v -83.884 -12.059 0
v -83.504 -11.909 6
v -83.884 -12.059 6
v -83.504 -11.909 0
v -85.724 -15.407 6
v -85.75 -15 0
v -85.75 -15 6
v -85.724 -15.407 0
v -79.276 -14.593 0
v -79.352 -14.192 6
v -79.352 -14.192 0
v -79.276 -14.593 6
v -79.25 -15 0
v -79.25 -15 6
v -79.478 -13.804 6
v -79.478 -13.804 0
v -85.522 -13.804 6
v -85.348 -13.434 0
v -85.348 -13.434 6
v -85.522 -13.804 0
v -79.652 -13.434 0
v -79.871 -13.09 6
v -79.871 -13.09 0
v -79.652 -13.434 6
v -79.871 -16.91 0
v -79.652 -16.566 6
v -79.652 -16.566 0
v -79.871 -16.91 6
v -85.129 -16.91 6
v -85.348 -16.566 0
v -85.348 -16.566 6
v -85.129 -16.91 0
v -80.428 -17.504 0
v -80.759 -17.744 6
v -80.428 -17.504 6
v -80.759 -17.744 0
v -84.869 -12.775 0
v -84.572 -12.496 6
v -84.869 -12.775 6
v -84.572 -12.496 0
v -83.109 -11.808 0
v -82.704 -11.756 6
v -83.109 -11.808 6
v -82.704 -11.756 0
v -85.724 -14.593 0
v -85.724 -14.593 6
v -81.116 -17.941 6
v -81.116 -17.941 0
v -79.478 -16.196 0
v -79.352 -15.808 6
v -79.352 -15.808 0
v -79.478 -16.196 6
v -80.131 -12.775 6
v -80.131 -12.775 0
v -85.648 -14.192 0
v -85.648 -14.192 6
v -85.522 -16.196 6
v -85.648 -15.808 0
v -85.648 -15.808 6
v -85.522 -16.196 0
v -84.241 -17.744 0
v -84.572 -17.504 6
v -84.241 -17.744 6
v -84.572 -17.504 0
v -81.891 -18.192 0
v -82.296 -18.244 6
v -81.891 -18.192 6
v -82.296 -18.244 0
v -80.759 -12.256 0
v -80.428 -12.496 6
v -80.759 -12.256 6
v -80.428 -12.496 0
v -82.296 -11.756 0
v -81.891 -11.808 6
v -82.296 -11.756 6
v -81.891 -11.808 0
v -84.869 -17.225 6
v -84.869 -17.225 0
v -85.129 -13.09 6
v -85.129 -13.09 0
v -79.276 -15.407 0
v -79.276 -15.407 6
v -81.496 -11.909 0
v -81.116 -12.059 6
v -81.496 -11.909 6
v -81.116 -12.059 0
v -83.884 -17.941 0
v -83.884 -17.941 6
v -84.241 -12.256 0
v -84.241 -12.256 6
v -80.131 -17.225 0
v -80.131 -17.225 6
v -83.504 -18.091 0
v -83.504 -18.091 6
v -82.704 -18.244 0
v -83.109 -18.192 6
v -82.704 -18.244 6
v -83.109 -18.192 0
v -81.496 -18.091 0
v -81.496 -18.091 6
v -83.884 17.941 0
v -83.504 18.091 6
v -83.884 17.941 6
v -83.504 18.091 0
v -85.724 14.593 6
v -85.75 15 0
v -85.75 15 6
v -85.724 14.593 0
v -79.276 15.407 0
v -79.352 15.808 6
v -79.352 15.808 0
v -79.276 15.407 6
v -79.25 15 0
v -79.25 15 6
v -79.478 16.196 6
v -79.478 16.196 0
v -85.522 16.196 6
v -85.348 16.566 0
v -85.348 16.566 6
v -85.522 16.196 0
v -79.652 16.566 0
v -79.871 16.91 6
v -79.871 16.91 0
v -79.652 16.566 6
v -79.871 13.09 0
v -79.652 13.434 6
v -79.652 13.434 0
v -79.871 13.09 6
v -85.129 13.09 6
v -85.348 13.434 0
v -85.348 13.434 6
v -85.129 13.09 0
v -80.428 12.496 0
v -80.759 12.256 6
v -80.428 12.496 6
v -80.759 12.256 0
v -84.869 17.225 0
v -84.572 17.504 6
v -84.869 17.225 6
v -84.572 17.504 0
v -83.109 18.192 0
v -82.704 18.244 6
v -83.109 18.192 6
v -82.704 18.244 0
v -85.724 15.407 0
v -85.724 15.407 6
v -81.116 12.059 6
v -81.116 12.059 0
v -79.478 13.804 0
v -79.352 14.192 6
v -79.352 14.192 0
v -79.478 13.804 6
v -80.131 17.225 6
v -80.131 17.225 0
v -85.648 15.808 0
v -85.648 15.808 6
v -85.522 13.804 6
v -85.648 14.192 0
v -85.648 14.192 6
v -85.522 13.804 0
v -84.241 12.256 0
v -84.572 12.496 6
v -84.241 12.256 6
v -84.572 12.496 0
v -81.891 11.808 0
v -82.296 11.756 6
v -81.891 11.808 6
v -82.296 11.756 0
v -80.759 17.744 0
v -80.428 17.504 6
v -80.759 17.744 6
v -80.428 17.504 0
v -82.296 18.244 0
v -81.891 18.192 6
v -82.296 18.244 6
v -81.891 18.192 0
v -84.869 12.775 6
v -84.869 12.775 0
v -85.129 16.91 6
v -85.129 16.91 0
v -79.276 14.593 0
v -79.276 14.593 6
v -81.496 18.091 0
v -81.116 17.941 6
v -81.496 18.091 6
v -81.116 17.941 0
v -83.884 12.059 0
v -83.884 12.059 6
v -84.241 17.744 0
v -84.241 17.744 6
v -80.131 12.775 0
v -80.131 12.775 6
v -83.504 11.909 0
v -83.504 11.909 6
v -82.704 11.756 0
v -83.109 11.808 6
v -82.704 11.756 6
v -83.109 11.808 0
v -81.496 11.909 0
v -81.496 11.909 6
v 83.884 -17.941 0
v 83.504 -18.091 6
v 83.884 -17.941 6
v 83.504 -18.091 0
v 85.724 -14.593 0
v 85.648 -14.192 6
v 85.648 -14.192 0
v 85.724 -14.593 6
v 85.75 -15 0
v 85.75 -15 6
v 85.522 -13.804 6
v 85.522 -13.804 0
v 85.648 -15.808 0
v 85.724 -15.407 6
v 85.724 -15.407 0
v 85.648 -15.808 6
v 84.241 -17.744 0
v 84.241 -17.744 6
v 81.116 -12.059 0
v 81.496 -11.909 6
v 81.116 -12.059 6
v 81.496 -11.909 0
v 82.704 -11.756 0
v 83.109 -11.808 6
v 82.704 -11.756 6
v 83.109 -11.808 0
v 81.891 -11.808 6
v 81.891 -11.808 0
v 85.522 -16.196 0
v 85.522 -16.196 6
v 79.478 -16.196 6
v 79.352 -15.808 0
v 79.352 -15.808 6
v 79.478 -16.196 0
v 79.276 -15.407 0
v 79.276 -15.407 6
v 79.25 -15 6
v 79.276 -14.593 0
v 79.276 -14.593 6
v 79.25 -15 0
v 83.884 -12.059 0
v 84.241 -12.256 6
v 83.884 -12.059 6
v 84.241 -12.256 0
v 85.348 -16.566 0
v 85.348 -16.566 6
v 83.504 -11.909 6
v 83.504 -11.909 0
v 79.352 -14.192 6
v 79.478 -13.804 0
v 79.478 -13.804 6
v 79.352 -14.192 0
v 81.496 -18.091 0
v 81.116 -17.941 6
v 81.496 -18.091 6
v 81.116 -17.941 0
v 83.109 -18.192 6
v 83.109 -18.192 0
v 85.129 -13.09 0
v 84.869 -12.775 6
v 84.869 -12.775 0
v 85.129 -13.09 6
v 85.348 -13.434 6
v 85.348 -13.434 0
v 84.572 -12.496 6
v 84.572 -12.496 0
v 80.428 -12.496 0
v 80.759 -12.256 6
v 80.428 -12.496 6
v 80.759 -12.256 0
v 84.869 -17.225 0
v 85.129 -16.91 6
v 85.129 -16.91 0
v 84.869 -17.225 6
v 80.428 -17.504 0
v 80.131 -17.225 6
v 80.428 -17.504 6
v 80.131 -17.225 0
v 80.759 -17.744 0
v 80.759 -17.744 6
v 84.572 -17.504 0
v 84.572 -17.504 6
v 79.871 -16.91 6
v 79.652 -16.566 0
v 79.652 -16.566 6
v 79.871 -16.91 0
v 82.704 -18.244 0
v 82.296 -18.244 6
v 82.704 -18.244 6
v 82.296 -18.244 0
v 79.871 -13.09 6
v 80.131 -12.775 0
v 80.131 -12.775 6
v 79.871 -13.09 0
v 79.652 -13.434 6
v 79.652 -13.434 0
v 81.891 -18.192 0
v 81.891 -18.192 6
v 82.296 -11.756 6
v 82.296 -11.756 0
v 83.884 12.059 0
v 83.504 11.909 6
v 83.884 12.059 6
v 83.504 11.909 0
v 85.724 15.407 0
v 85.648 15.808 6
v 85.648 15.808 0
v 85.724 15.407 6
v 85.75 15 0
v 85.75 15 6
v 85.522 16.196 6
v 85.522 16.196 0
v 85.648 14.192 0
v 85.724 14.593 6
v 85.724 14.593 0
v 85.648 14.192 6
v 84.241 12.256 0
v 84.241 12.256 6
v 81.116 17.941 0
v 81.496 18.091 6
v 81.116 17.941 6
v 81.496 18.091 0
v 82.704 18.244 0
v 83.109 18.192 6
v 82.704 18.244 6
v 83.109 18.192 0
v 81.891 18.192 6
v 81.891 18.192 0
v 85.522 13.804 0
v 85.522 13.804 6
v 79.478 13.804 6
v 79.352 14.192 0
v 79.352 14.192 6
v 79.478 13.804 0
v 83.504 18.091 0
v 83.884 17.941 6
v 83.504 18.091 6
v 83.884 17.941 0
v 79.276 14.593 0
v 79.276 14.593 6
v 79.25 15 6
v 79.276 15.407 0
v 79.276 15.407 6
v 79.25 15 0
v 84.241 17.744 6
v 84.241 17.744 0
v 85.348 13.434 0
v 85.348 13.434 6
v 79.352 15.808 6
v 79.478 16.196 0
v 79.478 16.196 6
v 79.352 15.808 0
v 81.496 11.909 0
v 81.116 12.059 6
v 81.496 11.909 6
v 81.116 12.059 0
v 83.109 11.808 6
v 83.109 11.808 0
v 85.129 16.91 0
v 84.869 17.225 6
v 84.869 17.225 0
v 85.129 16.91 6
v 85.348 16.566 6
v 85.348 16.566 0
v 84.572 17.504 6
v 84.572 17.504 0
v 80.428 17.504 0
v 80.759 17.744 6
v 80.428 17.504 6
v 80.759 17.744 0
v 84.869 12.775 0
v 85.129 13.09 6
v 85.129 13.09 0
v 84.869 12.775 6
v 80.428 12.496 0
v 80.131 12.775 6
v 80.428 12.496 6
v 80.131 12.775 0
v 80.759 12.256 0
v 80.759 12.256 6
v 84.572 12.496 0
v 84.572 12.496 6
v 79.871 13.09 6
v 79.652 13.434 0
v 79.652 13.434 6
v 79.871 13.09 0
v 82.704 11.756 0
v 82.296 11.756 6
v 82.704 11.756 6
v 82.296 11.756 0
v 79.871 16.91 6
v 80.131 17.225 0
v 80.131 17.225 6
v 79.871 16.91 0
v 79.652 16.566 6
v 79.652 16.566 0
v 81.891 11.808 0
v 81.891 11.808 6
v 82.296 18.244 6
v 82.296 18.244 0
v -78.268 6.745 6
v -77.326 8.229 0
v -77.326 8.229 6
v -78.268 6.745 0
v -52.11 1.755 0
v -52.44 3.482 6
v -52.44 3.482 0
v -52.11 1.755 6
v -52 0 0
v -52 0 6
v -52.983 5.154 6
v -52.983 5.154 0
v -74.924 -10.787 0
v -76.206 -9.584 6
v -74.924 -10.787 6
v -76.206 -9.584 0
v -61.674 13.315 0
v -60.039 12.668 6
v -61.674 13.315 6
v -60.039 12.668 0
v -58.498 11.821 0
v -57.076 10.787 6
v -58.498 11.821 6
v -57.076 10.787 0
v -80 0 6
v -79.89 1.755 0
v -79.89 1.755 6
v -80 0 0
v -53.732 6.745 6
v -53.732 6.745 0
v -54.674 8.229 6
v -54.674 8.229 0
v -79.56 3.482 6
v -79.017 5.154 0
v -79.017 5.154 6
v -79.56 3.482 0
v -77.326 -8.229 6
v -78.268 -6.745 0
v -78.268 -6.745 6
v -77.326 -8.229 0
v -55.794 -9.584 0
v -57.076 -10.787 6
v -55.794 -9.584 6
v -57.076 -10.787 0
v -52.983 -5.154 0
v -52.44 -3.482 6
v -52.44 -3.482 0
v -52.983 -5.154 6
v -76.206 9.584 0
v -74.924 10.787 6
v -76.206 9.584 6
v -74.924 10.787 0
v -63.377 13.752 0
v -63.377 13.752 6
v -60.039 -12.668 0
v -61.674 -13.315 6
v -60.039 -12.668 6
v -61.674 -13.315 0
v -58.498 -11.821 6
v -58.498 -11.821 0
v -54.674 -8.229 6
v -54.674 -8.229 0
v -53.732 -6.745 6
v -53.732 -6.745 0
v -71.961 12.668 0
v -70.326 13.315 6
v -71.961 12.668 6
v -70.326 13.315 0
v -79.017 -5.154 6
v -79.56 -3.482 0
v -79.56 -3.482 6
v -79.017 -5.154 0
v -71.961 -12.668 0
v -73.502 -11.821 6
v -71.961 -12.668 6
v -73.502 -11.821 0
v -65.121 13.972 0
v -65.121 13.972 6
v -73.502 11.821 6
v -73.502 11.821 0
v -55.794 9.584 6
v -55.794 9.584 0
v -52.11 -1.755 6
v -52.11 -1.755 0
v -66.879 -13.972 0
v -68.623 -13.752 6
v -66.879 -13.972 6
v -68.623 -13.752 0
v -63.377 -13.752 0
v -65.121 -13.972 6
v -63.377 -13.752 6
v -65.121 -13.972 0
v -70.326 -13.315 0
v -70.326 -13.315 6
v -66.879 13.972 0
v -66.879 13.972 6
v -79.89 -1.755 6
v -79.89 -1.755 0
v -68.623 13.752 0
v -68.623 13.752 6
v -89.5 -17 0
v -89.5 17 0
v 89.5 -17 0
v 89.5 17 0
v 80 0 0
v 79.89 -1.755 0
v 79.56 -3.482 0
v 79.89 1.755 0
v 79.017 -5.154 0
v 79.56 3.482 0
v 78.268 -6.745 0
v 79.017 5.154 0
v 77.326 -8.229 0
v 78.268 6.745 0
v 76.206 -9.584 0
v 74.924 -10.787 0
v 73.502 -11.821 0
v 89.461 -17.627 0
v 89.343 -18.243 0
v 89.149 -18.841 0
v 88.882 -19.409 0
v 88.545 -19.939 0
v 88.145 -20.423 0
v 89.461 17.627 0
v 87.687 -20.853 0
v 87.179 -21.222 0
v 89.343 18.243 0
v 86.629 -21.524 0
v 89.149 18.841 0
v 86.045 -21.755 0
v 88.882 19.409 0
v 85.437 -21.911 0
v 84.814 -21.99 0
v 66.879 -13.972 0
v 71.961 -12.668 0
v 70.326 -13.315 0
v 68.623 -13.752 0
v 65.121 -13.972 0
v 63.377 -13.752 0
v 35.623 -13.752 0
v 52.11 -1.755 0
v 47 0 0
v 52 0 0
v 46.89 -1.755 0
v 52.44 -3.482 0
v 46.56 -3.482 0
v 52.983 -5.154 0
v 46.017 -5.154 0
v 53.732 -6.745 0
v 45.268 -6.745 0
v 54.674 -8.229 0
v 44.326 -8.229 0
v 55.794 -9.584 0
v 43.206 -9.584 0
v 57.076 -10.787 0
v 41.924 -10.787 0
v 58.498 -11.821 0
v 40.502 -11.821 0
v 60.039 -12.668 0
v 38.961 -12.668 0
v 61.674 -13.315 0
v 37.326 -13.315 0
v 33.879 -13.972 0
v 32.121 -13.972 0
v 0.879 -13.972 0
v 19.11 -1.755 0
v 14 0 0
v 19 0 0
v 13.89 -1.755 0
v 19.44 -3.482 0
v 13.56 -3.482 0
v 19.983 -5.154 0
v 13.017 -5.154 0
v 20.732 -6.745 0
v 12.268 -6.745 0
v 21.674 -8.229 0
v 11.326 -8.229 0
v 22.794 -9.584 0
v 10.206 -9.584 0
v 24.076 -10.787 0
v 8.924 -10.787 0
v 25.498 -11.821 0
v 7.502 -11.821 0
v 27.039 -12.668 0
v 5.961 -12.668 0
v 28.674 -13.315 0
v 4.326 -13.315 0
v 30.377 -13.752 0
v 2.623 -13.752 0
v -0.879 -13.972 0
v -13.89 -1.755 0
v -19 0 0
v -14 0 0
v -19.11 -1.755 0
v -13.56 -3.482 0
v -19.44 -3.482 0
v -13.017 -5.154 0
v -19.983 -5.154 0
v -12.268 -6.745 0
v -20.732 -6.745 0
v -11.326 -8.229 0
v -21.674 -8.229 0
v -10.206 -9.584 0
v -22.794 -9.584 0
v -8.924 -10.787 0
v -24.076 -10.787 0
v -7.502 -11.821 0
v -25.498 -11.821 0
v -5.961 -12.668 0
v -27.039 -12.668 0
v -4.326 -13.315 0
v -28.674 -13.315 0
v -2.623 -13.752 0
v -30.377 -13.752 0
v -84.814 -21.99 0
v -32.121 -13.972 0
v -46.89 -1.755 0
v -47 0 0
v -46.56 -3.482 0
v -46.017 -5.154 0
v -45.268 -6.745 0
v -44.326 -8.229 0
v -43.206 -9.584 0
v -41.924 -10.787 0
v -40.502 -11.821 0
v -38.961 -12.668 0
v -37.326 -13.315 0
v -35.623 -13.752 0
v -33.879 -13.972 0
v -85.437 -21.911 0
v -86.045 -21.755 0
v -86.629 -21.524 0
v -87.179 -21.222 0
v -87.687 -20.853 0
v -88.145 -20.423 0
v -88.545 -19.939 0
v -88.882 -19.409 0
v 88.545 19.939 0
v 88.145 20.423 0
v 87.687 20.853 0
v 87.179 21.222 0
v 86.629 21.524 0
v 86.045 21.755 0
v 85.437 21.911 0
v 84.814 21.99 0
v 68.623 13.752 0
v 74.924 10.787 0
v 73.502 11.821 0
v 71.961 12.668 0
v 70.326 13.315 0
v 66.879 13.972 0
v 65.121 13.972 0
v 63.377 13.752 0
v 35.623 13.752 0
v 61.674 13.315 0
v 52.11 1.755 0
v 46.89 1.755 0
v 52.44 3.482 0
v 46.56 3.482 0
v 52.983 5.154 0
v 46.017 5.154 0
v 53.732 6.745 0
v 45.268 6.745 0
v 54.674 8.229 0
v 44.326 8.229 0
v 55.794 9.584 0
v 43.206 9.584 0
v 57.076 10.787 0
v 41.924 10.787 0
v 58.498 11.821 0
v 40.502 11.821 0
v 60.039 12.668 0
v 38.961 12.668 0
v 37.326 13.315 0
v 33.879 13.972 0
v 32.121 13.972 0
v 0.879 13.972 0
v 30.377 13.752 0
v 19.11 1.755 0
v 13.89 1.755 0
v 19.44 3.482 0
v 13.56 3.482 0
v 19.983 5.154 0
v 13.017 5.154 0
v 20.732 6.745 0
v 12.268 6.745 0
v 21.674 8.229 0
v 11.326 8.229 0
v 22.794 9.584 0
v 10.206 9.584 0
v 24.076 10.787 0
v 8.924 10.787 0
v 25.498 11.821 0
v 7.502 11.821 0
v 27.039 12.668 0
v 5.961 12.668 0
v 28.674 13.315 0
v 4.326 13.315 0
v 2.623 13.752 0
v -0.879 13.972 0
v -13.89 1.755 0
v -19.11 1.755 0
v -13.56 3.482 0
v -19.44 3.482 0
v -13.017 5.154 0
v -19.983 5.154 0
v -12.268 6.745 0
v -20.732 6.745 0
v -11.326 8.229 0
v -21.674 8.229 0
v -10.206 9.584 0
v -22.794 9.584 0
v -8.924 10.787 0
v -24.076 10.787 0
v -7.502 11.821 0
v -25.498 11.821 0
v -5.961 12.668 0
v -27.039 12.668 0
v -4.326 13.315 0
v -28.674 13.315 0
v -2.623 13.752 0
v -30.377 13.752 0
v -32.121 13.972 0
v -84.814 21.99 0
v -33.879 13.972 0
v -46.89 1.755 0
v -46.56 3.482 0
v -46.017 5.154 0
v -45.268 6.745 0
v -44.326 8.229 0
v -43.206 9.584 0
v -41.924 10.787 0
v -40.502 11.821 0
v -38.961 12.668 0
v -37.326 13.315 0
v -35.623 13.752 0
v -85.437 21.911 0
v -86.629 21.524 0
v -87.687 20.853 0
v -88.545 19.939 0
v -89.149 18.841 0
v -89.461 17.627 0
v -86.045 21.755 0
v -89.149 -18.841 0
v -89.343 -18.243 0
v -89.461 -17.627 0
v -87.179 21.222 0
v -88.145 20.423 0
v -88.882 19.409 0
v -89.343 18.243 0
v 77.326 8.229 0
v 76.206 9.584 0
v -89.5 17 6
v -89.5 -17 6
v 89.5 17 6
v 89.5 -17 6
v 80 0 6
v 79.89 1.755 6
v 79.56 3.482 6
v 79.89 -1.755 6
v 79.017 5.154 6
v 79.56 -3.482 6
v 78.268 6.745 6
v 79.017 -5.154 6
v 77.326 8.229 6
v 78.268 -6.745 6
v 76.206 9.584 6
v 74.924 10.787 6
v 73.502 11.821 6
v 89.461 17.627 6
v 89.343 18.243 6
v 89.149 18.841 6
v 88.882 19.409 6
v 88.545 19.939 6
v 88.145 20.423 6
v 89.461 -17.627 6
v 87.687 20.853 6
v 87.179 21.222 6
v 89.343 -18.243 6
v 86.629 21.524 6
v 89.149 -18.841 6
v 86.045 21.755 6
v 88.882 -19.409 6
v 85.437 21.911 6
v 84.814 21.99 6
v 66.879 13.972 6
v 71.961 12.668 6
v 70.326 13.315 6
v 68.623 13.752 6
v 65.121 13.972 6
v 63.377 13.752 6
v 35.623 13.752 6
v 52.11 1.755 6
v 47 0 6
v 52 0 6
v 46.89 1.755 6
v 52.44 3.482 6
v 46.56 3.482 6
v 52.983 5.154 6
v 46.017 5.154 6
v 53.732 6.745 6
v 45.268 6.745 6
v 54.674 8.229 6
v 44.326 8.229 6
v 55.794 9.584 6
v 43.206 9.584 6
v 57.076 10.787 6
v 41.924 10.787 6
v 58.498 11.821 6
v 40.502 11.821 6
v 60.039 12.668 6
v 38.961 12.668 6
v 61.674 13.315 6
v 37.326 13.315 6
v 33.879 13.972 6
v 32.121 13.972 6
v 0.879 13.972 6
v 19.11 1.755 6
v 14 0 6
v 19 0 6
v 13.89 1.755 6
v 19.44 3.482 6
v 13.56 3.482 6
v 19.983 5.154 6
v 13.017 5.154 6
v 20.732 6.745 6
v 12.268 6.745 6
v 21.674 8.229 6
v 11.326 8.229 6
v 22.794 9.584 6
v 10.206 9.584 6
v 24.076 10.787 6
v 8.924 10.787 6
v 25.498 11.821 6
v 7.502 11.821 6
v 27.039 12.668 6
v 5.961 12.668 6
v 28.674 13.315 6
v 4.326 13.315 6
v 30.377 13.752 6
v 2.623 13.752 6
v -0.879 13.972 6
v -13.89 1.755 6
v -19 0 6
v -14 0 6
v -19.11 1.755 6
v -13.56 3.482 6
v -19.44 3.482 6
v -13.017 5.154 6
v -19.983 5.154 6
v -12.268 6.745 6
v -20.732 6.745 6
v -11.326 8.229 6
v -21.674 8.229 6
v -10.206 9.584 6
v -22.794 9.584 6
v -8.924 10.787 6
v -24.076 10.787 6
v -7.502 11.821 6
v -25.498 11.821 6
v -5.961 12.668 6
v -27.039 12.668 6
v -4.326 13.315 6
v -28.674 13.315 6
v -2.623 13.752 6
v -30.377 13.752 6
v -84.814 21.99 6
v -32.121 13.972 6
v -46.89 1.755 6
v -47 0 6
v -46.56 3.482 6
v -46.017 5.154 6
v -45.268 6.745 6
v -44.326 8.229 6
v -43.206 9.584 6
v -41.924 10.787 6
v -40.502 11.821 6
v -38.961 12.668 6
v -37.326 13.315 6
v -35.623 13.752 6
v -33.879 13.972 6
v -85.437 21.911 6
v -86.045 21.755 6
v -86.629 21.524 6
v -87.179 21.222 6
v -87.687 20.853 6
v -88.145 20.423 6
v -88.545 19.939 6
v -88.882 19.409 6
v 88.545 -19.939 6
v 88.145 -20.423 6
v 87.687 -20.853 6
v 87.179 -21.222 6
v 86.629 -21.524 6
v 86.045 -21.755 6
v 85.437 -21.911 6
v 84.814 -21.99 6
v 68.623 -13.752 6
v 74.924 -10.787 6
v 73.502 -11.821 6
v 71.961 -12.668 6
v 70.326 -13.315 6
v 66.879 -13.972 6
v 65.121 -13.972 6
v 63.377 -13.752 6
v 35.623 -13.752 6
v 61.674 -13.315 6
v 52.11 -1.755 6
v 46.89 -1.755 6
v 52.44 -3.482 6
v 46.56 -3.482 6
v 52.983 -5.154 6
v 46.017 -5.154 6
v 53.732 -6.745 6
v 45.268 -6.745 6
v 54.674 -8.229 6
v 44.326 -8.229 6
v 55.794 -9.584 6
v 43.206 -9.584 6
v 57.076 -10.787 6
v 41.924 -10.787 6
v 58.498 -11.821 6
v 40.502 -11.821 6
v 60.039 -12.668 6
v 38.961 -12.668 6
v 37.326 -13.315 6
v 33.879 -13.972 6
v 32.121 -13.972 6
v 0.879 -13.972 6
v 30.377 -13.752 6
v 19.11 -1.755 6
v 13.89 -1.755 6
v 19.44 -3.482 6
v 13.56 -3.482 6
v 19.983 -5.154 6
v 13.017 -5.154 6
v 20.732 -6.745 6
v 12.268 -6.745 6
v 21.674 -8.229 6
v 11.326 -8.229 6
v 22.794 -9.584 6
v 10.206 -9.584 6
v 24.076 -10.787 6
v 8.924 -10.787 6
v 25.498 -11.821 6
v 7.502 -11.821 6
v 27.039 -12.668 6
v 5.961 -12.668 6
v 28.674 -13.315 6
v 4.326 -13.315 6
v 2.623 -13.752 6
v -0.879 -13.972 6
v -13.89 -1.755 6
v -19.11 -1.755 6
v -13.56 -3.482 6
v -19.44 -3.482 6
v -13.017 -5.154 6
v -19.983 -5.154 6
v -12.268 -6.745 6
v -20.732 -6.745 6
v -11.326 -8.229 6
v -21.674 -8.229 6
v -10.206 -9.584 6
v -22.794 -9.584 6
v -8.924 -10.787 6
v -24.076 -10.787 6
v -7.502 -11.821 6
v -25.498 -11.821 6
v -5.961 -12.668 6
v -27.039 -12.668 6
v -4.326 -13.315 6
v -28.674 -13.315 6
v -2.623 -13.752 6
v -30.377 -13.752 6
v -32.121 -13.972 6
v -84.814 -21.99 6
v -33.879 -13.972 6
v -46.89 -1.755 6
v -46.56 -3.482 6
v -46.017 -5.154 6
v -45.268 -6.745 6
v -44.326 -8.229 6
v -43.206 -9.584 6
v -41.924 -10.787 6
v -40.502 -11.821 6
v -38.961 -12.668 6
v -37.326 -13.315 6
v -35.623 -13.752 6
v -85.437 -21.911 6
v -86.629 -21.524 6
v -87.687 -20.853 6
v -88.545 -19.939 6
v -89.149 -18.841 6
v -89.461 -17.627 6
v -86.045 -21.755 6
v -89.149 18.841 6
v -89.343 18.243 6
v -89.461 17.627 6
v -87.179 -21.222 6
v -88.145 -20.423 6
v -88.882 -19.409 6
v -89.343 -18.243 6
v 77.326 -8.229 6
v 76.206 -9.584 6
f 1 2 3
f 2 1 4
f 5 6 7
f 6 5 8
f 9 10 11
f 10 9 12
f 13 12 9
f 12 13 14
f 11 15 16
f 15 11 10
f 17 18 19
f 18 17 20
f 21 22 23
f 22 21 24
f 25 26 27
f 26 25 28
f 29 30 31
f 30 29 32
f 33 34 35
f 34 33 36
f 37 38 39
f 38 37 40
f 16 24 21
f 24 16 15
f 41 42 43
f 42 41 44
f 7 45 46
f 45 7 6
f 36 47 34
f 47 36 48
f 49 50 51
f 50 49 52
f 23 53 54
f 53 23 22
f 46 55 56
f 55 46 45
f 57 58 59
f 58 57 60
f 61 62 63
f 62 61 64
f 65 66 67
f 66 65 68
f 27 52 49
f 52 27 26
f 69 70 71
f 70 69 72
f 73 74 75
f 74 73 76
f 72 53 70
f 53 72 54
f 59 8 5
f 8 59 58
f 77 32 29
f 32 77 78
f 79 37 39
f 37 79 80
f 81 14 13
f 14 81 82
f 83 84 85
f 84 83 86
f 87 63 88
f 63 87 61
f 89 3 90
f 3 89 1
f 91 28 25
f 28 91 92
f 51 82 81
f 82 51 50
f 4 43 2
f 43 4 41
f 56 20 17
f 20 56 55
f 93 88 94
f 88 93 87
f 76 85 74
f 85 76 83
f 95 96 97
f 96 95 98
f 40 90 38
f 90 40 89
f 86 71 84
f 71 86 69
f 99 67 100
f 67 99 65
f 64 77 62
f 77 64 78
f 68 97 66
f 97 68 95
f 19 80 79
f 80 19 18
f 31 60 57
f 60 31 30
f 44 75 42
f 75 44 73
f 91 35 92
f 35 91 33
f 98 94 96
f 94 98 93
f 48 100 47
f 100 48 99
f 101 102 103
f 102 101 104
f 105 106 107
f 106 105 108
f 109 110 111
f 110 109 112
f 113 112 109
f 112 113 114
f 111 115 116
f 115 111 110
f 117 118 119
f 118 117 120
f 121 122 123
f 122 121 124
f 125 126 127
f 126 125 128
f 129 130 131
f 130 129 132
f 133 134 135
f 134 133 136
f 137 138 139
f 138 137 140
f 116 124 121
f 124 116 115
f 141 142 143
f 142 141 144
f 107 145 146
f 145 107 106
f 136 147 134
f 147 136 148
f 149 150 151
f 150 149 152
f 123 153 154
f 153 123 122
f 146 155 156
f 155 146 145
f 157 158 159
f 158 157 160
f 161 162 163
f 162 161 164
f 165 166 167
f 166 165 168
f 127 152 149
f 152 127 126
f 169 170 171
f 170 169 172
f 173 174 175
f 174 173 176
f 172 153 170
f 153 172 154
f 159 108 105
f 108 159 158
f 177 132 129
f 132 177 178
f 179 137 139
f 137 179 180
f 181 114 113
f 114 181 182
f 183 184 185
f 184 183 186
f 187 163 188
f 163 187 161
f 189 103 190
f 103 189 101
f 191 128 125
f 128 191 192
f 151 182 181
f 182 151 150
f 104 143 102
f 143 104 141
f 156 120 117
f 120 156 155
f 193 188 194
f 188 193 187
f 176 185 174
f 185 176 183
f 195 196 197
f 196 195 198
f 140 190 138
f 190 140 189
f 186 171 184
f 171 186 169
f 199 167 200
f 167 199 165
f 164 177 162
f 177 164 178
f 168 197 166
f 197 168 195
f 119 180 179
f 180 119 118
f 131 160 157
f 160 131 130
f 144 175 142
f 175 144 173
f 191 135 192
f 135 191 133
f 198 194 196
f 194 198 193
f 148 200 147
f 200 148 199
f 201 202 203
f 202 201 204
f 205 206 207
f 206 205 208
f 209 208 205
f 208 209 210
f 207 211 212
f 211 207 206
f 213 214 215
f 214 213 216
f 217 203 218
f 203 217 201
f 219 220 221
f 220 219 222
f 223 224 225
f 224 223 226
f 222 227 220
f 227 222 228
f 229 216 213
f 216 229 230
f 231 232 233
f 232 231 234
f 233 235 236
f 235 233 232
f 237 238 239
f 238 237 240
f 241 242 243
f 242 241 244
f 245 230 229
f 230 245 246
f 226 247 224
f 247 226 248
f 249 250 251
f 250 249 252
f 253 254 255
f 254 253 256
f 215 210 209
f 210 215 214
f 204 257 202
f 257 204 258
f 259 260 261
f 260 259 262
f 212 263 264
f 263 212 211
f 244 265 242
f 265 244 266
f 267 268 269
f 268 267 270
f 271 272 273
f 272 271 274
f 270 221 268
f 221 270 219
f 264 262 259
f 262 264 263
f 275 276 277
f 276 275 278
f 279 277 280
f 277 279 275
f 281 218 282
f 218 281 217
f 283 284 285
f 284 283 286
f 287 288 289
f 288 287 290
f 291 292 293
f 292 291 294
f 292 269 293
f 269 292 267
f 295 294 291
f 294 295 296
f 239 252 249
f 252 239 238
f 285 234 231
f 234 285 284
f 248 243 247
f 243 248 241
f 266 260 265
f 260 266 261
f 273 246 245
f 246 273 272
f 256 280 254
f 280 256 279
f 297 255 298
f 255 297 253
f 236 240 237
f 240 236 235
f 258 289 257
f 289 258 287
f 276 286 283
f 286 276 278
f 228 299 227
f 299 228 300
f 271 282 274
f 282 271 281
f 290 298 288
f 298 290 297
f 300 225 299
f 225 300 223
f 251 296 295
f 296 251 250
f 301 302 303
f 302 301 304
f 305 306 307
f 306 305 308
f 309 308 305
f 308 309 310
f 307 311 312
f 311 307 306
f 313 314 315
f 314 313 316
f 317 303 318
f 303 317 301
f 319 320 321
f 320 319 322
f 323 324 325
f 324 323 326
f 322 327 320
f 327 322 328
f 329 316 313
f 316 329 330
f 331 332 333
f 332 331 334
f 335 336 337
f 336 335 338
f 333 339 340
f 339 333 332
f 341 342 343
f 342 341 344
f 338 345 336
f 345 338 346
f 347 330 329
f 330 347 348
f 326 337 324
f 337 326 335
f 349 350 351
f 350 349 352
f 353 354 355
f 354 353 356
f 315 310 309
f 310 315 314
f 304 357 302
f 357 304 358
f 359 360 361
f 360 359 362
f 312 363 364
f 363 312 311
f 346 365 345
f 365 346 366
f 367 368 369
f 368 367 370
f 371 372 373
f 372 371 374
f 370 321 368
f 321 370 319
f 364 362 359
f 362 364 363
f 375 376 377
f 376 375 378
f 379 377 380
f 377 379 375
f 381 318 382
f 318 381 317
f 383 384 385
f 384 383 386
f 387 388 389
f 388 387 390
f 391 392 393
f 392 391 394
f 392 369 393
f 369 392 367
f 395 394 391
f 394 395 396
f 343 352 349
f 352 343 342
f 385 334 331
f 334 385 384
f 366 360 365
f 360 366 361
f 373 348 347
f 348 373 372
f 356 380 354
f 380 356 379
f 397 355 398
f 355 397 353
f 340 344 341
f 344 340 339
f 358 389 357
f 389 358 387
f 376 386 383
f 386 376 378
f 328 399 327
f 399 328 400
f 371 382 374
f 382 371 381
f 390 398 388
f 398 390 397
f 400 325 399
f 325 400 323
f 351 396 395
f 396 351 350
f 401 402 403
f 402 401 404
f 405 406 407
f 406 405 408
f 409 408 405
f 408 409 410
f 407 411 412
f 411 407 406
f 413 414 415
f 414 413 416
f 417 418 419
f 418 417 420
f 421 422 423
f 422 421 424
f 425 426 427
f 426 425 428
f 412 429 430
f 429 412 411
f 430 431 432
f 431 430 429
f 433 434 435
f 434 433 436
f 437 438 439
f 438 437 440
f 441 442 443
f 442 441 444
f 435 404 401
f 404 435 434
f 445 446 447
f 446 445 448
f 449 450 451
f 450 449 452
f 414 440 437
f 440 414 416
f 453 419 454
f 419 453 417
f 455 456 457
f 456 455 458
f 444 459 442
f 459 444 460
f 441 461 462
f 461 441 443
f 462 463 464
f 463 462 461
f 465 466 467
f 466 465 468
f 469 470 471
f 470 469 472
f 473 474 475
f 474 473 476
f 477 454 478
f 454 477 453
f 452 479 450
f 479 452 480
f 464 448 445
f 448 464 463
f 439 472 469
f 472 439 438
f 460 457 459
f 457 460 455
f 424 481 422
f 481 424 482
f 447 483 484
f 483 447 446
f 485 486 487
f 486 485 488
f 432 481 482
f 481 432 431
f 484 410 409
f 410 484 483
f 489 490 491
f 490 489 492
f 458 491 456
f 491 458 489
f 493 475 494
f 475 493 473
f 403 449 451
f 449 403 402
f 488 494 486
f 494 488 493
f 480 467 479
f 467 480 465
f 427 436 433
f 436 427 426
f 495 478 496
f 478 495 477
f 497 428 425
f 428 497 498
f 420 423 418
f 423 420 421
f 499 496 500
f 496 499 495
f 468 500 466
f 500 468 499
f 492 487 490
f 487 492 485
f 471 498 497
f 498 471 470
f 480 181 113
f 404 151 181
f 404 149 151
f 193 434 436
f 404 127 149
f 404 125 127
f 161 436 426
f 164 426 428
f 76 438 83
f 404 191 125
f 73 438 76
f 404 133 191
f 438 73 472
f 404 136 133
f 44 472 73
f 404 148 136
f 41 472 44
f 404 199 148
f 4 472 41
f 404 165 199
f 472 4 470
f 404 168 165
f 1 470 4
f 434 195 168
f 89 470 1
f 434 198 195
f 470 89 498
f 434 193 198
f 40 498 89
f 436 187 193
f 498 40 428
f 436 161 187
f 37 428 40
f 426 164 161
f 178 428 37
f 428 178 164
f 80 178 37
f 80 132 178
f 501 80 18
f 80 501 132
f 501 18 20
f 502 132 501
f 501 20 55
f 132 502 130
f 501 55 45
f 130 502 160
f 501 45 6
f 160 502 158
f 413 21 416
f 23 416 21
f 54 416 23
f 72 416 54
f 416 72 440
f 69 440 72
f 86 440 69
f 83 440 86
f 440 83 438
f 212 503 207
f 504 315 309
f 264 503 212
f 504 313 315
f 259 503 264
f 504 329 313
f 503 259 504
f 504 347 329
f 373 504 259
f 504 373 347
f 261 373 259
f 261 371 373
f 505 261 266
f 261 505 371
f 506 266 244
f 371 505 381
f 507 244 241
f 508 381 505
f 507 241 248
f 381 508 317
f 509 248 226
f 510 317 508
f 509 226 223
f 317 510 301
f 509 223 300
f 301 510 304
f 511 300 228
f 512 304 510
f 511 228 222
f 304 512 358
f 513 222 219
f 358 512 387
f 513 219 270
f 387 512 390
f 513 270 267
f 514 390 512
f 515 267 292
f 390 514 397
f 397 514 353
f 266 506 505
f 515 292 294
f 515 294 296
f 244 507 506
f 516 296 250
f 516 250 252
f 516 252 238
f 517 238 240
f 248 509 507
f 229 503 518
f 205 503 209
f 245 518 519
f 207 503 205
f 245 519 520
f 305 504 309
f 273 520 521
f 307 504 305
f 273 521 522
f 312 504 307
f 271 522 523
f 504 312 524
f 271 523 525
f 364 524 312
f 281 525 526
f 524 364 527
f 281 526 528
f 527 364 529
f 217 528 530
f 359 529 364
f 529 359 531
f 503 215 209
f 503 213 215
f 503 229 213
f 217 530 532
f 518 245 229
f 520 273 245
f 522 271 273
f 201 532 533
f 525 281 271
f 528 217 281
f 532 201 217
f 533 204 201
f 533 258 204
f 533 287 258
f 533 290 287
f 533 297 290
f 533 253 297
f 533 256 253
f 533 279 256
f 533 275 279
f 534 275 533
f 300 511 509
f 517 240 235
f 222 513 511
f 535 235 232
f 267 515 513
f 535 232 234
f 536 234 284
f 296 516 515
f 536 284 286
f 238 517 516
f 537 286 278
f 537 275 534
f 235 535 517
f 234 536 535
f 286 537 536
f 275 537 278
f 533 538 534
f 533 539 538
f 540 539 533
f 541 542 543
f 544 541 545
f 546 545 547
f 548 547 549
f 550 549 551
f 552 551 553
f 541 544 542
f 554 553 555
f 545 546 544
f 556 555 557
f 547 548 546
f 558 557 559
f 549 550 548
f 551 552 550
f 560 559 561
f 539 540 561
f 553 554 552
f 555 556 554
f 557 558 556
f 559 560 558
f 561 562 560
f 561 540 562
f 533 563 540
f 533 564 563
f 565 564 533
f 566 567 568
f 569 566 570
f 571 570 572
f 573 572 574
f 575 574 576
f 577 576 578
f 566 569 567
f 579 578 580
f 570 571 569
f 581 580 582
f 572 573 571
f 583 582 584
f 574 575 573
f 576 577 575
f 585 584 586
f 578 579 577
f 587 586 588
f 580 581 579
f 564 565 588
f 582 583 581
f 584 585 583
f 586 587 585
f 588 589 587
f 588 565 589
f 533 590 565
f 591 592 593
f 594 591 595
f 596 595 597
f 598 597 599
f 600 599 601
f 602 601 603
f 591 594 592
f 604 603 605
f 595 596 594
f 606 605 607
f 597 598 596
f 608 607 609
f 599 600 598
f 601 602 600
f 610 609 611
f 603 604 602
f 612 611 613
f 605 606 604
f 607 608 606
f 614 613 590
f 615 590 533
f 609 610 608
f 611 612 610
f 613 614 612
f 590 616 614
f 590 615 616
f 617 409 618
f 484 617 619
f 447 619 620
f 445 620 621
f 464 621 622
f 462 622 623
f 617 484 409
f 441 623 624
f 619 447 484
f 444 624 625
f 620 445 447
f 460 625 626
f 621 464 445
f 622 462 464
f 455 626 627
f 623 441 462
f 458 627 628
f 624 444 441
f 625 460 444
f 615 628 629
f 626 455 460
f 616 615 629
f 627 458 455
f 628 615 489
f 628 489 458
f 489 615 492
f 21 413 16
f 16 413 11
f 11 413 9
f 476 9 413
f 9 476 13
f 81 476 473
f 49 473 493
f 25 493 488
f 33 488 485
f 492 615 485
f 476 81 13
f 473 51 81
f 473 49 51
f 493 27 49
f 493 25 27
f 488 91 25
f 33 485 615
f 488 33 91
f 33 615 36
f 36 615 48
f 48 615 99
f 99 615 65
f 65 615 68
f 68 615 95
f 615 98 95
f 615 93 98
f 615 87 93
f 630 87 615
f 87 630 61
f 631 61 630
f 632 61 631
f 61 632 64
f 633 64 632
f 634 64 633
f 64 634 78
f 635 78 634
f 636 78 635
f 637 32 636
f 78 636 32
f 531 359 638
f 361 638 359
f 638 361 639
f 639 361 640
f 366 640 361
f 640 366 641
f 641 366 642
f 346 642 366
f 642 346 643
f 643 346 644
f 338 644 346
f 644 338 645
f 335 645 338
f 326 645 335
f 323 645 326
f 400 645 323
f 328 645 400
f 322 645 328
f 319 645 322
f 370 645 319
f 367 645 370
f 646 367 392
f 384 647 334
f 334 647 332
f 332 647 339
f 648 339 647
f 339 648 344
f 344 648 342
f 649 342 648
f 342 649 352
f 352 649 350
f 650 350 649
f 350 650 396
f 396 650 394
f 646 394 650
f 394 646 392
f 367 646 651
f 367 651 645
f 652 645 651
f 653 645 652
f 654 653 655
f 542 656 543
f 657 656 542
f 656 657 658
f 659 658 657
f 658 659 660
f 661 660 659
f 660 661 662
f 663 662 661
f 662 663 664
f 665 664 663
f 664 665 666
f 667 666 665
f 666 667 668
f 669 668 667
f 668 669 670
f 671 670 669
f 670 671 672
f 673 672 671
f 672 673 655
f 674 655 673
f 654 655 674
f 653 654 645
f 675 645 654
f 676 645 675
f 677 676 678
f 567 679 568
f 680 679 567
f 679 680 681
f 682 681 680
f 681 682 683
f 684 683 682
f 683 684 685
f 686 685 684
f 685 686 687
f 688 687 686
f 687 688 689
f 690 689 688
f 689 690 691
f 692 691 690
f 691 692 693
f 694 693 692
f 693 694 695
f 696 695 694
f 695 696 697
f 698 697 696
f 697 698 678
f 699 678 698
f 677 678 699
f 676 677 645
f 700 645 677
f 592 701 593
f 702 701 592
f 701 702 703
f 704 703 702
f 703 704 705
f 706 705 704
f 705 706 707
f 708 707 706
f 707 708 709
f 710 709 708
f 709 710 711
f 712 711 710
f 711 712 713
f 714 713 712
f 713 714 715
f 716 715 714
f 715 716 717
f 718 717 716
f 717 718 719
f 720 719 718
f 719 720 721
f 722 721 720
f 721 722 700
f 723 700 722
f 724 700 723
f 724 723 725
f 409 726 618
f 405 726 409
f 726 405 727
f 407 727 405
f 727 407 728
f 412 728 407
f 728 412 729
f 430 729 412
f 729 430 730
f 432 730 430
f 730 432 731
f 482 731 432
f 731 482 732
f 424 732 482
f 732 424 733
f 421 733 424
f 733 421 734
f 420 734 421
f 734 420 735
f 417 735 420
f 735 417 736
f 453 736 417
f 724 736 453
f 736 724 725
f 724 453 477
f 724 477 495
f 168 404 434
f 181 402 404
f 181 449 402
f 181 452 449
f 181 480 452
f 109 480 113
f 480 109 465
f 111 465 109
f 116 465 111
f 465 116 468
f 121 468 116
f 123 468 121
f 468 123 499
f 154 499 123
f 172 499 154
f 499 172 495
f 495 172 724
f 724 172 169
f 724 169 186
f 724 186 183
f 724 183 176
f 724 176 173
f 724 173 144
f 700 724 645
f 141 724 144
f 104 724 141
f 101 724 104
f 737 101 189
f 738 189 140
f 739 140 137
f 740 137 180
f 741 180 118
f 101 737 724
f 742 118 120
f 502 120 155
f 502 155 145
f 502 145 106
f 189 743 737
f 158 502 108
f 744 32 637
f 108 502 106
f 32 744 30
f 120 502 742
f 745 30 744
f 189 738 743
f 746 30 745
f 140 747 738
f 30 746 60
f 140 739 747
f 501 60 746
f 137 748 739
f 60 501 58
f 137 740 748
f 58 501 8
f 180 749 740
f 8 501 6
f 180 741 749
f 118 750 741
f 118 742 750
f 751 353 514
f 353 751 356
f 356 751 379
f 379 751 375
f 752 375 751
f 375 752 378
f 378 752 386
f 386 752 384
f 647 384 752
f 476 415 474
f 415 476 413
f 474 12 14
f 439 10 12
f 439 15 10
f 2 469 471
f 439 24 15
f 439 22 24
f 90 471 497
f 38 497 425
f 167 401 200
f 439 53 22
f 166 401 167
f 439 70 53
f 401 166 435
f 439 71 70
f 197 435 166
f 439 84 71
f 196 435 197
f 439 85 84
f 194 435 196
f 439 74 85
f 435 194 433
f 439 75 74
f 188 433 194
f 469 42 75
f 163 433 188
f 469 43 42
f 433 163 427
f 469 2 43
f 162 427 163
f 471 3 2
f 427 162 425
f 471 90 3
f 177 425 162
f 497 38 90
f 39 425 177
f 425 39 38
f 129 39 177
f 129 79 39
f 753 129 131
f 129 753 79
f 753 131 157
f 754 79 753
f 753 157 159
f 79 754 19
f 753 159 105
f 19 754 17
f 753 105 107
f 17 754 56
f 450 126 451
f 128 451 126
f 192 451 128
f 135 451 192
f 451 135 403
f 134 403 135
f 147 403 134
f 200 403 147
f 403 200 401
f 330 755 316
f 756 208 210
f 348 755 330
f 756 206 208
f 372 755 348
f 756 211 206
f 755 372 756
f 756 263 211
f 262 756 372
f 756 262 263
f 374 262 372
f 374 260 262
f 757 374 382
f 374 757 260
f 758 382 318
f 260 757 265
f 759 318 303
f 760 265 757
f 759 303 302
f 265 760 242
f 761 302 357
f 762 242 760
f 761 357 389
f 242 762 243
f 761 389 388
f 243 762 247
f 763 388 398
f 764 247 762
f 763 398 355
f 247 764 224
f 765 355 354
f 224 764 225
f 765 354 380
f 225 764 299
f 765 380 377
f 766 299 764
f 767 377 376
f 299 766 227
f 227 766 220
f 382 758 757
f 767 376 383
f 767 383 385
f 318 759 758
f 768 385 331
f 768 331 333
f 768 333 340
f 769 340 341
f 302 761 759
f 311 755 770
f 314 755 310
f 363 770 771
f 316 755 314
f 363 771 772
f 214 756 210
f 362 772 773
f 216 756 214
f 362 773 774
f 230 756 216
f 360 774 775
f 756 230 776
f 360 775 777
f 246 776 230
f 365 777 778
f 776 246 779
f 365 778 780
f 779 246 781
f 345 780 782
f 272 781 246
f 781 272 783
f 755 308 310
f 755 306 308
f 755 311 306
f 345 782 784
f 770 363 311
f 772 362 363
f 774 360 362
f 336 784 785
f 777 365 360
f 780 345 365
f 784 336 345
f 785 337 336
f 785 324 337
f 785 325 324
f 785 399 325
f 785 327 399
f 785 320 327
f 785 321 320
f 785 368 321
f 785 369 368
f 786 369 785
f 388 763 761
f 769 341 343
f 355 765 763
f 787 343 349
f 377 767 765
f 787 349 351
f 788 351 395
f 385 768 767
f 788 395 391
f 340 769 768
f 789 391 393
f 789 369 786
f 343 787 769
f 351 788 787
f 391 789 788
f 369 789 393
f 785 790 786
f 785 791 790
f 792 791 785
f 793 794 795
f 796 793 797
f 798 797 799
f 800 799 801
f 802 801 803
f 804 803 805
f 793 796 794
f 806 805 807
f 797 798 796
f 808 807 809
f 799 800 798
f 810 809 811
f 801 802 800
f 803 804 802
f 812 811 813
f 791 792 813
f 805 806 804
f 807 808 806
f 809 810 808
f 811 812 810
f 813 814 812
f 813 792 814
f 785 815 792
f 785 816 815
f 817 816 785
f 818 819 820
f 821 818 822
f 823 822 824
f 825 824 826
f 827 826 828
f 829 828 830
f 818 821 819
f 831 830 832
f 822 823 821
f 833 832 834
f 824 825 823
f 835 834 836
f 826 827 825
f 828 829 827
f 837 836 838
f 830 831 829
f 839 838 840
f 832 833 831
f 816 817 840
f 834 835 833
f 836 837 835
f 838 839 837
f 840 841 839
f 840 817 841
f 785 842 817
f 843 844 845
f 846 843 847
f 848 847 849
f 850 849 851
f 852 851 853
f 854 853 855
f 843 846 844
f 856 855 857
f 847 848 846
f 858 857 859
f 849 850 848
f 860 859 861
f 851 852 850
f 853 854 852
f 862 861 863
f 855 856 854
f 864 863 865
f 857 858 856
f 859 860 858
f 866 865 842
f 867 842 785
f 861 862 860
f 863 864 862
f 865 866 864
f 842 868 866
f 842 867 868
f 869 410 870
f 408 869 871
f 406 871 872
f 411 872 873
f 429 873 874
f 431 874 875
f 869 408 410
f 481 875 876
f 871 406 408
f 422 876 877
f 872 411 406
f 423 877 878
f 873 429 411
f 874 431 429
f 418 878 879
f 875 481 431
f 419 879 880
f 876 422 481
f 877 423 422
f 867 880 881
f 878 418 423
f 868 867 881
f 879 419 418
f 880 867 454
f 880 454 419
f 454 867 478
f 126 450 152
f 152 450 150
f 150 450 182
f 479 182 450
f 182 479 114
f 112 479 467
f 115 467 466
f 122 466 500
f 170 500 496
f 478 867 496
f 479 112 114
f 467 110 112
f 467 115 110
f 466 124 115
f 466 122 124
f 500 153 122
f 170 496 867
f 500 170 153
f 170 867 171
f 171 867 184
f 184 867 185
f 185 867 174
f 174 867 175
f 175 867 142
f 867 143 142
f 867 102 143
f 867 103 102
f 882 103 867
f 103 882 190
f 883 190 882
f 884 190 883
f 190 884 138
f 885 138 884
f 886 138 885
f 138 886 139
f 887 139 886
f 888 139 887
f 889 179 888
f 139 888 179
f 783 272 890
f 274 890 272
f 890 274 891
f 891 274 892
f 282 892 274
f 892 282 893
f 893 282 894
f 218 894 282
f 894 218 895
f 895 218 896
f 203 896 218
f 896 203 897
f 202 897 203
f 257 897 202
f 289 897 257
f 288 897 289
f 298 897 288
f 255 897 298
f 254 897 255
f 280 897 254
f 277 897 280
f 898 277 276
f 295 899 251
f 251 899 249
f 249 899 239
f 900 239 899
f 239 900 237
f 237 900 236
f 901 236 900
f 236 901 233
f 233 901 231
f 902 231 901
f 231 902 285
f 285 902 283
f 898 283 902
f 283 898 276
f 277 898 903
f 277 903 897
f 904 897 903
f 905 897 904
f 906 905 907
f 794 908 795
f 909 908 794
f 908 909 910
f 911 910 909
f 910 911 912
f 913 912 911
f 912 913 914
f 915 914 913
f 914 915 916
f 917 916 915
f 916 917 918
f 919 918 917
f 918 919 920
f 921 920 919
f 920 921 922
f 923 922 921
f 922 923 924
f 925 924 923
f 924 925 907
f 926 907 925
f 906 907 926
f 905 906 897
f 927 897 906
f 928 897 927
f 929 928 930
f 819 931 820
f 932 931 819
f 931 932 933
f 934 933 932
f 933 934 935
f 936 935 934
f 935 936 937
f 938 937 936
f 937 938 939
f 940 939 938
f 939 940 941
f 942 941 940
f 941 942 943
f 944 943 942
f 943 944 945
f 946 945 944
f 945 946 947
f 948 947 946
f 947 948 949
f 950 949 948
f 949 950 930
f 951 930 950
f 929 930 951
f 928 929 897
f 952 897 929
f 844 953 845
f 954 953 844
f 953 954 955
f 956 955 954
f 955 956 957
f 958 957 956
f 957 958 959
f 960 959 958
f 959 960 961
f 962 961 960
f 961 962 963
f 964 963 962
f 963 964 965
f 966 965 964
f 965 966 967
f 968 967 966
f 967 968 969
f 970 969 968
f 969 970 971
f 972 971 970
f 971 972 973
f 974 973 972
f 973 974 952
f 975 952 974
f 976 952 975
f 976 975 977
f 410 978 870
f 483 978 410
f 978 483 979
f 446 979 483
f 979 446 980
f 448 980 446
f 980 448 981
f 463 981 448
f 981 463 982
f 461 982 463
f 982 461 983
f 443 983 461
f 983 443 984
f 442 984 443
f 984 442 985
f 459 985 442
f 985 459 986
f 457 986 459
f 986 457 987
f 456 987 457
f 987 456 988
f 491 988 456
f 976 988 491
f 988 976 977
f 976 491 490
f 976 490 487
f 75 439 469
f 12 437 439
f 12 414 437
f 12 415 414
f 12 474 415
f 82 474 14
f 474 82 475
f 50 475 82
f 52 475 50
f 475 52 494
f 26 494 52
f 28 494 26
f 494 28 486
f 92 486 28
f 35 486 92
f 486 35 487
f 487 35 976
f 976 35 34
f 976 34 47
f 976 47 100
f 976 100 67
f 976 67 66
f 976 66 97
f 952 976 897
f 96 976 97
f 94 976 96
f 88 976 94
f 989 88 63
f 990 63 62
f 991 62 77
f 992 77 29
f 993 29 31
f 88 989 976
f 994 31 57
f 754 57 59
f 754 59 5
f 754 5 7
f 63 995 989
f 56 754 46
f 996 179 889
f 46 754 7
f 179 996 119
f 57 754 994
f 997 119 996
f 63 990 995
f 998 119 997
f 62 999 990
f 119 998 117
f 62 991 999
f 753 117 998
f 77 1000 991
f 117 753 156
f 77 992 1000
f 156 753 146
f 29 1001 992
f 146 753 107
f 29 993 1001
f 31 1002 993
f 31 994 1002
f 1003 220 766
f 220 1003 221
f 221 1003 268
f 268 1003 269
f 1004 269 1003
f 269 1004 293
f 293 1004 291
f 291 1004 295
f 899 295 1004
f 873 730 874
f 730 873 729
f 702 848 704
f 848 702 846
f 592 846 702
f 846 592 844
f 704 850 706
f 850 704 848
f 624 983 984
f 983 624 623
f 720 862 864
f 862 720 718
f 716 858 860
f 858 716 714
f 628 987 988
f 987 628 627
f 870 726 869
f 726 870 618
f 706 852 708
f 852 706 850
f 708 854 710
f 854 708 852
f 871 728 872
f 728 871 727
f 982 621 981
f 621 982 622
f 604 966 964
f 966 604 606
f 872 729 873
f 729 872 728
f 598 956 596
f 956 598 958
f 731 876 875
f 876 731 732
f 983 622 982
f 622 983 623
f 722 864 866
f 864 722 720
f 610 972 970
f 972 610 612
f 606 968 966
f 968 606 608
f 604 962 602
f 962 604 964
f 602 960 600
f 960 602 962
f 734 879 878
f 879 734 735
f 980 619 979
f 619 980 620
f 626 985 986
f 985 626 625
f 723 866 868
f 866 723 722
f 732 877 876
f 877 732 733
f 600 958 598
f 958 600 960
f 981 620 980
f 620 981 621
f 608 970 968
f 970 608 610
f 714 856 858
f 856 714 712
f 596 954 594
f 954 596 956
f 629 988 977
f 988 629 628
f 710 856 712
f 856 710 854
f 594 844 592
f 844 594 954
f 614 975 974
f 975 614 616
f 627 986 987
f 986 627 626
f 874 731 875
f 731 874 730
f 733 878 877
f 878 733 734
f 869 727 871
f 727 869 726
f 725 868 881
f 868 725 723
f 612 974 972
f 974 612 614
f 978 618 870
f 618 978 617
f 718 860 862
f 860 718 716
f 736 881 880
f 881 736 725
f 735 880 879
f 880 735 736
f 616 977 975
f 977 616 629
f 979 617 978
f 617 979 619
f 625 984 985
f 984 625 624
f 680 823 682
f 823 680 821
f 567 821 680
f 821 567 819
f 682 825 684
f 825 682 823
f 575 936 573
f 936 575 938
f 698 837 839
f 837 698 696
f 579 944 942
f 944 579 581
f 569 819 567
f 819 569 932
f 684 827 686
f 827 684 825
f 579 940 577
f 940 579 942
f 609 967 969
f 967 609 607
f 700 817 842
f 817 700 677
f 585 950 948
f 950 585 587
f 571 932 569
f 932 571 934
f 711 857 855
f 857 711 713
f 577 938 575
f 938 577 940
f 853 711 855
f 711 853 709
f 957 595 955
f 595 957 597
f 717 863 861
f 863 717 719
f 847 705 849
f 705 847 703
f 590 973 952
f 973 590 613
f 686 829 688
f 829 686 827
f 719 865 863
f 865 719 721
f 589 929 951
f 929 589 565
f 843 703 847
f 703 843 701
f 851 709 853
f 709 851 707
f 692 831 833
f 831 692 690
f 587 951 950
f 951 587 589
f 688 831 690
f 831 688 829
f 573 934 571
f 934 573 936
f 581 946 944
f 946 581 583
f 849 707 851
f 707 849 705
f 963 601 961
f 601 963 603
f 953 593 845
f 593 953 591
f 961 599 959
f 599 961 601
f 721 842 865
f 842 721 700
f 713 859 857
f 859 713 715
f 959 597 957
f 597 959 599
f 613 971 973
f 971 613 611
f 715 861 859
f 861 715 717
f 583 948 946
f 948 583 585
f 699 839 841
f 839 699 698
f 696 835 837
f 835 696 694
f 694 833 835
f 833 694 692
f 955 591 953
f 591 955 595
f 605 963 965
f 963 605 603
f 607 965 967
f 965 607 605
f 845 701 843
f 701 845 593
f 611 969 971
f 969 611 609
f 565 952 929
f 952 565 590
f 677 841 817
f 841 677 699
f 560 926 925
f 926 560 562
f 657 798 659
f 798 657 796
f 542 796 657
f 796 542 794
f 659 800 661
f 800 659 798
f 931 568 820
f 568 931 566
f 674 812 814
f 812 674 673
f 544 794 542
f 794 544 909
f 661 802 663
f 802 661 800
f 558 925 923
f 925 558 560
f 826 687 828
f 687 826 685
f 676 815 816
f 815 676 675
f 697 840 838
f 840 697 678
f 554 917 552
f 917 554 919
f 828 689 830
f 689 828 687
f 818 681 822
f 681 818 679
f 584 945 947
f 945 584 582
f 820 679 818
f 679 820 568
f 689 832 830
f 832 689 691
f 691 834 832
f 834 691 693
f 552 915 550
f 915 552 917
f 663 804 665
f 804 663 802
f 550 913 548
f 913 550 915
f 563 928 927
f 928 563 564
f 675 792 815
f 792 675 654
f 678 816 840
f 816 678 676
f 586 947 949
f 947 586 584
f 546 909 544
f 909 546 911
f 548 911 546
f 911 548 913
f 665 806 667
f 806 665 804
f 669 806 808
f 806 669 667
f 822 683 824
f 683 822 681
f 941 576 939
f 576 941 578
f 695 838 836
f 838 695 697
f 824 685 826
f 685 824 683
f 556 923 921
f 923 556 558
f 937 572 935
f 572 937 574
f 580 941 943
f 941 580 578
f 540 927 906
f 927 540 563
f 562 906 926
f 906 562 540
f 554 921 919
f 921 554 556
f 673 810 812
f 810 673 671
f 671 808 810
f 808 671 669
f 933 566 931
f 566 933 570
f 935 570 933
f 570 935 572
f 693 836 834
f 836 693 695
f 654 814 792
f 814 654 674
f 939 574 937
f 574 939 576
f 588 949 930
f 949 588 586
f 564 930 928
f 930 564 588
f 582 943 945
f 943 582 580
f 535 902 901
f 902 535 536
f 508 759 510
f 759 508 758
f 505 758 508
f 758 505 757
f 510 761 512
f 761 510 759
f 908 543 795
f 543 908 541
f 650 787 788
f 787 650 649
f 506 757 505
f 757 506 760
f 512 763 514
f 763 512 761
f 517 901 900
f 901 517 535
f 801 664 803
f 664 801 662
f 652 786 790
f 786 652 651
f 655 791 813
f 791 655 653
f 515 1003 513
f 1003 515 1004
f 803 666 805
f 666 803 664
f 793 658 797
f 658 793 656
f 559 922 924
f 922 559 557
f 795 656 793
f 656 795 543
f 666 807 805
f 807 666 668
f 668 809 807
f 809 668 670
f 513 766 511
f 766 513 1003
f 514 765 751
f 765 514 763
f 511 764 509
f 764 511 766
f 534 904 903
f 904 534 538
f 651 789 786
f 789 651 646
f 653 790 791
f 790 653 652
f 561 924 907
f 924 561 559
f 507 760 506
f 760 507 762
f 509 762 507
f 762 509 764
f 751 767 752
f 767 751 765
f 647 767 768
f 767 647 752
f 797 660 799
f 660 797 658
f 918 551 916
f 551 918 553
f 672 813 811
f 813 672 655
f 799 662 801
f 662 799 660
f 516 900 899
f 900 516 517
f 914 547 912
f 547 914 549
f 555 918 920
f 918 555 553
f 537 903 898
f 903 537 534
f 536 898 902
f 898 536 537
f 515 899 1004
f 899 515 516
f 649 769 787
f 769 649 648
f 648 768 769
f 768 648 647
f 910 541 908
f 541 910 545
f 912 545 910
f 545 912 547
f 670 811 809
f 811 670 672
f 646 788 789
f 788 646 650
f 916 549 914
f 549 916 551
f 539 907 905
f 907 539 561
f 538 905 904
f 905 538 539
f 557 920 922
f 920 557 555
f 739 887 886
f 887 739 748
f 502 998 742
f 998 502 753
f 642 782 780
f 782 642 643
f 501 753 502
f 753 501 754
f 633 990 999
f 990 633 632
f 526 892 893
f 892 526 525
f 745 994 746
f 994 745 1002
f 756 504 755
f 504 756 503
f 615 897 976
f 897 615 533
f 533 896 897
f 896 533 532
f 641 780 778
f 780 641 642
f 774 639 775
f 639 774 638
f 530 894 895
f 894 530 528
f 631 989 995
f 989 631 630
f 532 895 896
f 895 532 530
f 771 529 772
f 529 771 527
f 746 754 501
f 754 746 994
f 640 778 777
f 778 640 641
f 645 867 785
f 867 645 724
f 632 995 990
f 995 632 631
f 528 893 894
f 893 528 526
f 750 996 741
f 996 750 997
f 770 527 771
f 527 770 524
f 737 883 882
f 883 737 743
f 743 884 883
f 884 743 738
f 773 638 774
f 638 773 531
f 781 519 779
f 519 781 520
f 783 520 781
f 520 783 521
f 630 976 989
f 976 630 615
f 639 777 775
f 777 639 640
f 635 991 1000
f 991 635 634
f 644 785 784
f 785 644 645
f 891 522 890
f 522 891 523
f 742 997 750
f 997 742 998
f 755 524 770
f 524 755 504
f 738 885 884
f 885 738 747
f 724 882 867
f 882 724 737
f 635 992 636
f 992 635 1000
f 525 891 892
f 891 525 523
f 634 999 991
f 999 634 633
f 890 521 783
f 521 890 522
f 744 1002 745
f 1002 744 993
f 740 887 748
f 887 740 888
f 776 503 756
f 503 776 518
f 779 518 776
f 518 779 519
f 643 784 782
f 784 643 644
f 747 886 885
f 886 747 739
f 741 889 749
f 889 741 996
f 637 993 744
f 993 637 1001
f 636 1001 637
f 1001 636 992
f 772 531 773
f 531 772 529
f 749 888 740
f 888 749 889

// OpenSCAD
$fn = 50;

difference() {
	union() {
		hull() {
			translate(v = [-84.5, 17.0, 0]) {
				cylinder(h = 6, r = 5);
			}
			translate(v = [84.5, 17.0, 0]) {
				cylinder(h = 6, r = 5);
			}
			translate(v = [-84.5, -17.0, 0]) {
				cylinder(h = 6, r = 5);
			}
			translate(v = [84.5, -17.0, 0]) {
				cylinder(h = 6, r = 5);
			}
		}
	}
	union() {
		translate(v = [-82.5, -15.0, -100.0]) {
			cylinder(h = 200, r = 3.25);
		}
		translate(v = [-82.5, 15.0, -100.0]) {
			cylinder(h = 200, r = 3.25);
		}
		translate(v = [82.5, -15.0, -100.0]) {
			cylinder(h = 200, r = 3.25);
		}
		translate(v = [82.5, 15.0, -100.0]) {
			cylinder(h = 200, r = 3.25);
		}
		translate(v = [-82.5, -15.0, -100.0]) {
			cylinder(h = 200, r = 1.8);
		}
		translate(v = [-82.5, 15.0, -100.0]) {
			cylinder(h = 200, r = 1.8);
		}
		translate(v = [82.5, -15.0, -100.0]) {
			cylinder(h = 200, r = 1.8);
		}
		translate(v = [82.5, 15.0, -100.0]) {
			cylinder(h = 200, r = 1.8);
		}
		translate(v = [-66.0, 0, 0.0]) {
			cylinder(h = 6, r = 14.0);
		}
		translate(v = [-33.0, 0, 0.0]) {
			cylinder(h = 6, r = 14.0);
		}
		cylinder(h = 6, r = 14.0);
		translate(v = [33.0, 0, 0.0]) {
			cylinder(h = 6, r = 14.0);
		}
		translate(v = [66.0, 0, 0.0]) {
			cylinder(h = 6, r = 14.0);
		}
	}
}
